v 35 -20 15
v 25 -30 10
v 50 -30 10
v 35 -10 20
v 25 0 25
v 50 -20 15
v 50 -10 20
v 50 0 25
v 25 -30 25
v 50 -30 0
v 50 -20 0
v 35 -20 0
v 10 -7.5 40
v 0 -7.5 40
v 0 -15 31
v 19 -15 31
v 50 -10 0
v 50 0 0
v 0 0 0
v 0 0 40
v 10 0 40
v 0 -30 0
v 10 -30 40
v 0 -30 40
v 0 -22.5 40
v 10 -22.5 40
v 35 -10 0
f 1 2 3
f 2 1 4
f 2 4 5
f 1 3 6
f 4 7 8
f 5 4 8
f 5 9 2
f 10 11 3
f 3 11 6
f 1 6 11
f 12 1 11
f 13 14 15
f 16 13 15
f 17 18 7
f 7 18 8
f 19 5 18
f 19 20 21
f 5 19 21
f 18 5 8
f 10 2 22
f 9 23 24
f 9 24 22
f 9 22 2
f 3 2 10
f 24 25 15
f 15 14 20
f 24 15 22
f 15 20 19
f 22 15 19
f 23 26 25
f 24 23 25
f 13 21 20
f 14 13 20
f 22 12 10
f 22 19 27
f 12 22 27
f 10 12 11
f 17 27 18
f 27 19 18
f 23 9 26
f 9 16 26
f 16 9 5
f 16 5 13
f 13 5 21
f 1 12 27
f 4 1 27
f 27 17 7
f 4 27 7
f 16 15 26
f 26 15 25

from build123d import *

# Parameters (mm, degrees)
F1_DEPTH = 30
F3_DEPTH = 50.001
F5_DEPTH = 25
F6_DEPTH = 15


with BuildPart() as f1:
    # F0 (on Front) → F1 (new body)
    with BuildSketch(Plane.XZ):
        Polygon((0, 40), (0, 0), (50, 0), (50, 25), (25, 25), (10, 40), align=None)
    extrude(amount=F1_DEPTH)

    # F2 (on face) → F3 (cut, through all)
    with BuildSketch(Plane(origin=(0, 0, 0), x_dir=(0, -1, 0), z_dir=(-1, 0, 0))):
        Polygon((7.5, 40), (15, 31), (22.5, 40), align=None)
    extrude(amount=-F3_DEPTH, mode=Mode.SUBTRACT)

    # F4 (on face) → F5 (cut, through all)
    with BuildSketch(Plane.YZ.offset(50)):
        Polygon((-10, 20), (0, 25), (-30, 25), (-30, 10), (-20, 15), align=None)
    extrude(amount=-F5_DEPTH, mode=Mode.SUBTRACT)

    # F4 (on face) → F6 (cut)
    with BuildSketch(Plane.YZ.offset(50)):
        Polygon((-10, 0), (-10, 20), (-20, 15), (-20, 0), align=None)
    extrude(amount=-F6_DEPTH, mode=Mode.SUBTRACT)


solid = f1.part
